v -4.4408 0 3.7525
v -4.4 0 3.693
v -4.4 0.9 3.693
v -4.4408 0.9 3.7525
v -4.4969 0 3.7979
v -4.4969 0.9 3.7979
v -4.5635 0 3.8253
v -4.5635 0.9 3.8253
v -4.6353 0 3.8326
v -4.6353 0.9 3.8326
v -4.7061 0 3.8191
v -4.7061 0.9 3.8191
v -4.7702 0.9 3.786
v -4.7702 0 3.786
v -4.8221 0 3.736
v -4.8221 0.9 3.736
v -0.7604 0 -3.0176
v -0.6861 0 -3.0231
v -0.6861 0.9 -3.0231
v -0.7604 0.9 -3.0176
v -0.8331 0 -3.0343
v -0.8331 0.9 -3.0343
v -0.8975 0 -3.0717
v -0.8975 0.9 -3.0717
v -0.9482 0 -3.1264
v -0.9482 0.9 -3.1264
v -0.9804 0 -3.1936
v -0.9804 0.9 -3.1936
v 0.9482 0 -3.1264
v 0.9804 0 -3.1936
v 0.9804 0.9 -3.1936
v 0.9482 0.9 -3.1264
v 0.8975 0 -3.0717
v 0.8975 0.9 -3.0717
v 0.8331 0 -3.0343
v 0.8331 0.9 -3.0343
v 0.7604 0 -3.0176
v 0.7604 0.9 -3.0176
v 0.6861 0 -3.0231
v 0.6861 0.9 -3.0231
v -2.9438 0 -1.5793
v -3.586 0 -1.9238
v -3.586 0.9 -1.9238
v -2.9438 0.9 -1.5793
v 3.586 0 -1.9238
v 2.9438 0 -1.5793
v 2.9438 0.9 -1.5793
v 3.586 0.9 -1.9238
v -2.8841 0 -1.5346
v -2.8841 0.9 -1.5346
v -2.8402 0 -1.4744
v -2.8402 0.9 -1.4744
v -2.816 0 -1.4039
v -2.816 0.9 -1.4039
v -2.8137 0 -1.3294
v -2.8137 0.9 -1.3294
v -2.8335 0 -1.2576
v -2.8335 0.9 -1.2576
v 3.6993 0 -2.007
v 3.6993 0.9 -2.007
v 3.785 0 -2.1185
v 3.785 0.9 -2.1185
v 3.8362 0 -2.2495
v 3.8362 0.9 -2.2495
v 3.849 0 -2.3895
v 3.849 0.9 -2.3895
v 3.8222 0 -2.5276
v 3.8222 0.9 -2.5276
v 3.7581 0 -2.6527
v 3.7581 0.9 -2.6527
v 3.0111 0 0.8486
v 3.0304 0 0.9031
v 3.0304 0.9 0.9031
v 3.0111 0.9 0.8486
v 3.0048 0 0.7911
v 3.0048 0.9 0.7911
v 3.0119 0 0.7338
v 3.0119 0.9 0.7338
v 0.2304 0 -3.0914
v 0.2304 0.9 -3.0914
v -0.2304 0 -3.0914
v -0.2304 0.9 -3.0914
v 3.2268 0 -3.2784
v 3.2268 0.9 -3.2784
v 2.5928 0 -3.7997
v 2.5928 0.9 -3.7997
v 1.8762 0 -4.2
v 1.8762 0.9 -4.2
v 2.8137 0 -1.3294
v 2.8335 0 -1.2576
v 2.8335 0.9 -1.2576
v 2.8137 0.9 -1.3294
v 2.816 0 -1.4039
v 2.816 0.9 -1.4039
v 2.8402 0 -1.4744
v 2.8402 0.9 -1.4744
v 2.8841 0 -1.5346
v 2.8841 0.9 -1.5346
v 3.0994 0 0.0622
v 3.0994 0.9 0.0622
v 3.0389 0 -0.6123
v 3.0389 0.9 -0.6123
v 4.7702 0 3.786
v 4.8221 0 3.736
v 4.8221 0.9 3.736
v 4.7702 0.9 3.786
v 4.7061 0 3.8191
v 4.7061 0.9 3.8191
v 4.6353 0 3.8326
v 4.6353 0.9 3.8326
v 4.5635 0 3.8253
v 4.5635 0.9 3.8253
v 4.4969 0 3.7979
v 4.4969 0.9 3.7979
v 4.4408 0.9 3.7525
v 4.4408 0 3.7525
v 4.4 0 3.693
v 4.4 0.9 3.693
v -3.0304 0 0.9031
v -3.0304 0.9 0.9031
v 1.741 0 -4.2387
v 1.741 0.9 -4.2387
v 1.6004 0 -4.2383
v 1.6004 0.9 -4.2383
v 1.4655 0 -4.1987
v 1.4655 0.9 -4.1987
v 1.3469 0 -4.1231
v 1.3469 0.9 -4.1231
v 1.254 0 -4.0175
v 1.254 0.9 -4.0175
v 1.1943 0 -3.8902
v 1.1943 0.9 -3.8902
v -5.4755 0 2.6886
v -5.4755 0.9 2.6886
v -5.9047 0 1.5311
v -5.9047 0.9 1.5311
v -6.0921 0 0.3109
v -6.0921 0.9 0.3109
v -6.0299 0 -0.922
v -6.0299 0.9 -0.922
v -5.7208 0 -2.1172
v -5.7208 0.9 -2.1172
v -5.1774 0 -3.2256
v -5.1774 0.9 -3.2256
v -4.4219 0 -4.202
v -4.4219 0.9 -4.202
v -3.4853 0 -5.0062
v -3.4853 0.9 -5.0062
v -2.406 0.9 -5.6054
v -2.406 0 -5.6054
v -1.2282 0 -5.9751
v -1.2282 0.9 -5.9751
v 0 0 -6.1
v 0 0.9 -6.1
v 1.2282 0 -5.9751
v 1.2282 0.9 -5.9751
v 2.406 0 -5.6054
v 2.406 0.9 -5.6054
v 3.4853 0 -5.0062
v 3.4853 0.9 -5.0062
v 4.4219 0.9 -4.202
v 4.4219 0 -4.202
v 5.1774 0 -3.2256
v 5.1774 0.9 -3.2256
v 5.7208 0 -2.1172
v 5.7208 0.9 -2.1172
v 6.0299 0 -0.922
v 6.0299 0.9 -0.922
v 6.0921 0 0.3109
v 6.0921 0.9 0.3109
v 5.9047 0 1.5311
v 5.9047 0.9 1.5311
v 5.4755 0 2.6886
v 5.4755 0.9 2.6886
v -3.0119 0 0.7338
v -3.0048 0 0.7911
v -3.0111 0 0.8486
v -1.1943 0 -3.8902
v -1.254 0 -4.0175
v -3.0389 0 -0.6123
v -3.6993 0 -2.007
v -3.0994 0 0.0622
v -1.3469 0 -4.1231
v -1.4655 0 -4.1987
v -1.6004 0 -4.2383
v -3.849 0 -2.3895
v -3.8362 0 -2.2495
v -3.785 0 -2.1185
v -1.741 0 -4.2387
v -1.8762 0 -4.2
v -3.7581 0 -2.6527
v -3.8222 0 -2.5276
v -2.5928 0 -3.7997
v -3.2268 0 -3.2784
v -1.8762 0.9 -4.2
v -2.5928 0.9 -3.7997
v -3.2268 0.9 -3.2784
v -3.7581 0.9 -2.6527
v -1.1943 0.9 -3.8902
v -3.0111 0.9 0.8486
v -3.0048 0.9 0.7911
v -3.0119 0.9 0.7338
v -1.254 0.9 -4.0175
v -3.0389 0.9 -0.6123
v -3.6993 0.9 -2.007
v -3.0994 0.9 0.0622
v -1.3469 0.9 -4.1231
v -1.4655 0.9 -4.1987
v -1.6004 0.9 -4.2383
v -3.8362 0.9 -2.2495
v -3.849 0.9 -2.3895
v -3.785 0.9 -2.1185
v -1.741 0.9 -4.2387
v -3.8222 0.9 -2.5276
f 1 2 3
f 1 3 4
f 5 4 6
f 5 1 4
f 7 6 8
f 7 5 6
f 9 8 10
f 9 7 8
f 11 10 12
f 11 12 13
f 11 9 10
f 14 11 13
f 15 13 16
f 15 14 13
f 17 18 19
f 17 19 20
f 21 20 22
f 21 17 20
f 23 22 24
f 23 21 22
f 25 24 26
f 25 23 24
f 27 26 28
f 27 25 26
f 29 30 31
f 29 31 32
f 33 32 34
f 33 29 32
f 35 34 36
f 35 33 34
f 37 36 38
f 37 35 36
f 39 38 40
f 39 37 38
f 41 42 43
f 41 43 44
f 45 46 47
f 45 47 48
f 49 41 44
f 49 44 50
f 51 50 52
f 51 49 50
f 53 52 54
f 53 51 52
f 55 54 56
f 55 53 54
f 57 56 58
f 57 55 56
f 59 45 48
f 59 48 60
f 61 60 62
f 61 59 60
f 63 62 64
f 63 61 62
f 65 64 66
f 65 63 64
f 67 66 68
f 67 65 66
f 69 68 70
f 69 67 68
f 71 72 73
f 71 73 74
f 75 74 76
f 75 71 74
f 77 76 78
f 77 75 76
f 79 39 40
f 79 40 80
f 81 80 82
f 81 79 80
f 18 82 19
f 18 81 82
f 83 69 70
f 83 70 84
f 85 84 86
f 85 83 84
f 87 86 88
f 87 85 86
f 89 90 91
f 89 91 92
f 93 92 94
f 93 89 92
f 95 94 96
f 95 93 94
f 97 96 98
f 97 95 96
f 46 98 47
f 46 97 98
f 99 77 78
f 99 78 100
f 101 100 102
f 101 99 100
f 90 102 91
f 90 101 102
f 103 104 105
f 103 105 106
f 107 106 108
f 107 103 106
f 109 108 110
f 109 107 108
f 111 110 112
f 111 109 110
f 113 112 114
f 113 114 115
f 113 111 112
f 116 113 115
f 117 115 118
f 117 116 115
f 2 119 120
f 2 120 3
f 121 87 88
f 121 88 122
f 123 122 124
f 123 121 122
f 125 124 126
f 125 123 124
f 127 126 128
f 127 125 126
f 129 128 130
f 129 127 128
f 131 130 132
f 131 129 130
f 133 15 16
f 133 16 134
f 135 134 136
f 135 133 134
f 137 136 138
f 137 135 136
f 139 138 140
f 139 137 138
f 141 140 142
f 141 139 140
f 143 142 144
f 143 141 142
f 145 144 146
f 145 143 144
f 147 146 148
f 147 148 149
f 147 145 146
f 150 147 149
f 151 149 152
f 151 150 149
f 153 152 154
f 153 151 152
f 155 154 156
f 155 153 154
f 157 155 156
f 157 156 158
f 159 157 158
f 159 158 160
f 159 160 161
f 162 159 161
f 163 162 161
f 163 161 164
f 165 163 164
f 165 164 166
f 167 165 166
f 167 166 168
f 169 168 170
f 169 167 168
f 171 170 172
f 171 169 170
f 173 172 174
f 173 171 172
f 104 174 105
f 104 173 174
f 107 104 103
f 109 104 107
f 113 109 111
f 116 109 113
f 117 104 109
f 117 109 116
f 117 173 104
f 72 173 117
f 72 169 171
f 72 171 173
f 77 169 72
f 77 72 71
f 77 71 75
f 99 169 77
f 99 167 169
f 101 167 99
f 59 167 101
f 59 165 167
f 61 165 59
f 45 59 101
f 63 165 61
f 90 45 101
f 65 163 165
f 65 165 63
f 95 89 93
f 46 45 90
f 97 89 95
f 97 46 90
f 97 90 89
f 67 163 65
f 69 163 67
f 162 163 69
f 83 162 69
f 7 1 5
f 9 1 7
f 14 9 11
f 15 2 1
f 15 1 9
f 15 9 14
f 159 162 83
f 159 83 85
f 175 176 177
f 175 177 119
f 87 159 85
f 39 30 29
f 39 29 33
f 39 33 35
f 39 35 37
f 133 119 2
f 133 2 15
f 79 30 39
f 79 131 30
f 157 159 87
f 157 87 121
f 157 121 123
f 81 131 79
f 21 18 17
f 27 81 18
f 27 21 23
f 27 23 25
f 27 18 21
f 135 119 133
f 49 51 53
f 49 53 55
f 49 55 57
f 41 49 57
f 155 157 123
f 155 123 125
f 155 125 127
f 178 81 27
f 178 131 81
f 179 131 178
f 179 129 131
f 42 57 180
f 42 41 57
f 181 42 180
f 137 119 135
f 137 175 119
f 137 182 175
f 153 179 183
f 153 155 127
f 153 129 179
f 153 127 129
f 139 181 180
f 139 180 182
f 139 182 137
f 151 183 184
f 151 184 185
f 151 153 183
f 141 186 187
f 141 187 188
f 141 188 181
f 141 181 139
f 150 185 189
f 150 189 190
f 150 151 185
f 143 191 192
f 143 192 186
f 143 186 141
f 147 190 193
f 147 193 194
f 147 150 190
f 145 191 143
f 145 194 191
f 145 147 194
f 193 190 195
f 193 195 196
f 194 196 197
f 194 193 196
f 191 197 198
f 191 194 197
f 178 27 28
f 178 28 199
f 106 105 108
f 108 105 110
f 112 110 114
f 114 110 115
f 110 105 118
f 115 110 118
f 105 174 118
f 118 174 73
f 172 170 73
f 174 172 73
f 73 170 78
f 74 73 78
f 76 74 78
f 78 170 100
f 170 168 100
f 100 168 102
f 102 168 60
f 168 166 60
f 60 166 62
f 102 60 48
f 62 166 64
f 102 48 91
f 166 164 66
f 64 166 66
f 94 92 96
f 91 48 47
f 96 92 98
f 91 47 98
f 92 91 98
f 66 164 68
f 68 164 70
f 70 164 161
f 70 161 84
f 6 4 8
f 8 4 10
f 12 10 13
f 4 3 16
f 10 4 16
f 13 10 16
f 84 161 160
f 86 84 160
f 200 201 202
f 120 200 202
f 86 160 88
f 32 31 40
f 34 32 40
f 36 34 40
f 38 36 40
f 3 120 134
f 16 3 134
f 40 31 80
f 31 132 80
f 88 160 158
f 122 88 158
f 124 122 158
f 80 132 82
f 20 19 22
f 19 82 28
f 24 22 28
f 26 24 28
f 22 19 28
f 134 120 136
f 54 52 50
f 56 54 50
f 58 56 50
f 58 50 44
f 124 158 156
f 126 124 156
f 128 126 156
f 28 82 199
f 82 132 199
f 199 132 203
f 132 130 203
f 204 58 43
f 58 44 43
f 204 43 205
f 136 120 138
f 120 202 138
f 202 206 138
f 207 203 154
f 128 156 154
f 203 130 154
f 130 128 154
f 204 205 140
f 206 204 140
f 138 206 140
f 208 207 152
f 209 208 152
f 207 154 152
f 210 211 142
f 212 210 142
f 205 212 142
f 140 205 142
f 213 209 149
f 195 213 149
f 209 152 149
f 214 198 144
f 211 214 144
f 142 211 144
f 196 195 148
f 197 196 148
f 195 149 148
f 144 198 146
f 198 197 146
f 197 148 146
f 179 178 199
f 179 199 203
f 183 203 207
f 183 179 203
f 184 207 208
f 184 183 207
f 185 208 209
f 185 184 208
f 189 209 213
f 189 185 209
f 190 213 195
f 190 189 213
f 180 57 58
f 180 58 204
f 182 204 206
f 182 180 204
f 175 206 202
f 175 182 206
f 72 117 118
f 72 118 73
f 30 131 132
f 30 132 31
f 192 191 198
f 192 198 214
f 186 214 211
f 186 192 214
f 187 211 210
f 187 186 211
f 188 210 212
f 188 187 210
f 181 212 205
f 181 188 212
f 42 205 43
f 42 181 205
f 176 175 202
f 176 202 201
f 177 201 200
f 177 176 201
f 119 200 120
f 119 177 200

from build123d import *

# Parameters (mm, degrees)
BOSS_EXTRUDE2_DEPTH = 0.9


with BuildPart() as part:
    # Sketch2 → Boss-Extrude2 (new body)
    with BuildSketch(Plane(origin=(0, 0, 0), x_dir=(1, 0, 0), z_dir=(0, 1, 0))):
        with BuildLine():
            Line((-0.980410681, 3.193555213), (-1.194279845, 3.890205091))
            ThreePointArc((-1.194279845, 3.890205091), (-1.465461571, 4.198694788), (-1.876197196, 4.1999862))
            ThreePointArc((-1.876197196, 4.1999862), (-2.921430522, 3.553201895), (-3.758071134, 2.652715844))
            ThreePointArc((-3.758071134, 2.652715844), (-3.836204314, 2.249478162), (-3.585956323, 1.92377682))
            Line((-3.585956323, 1.92377682), (-2.943790684, 1.579270847))
            ThreePointArc((-2.943790684, 1.579270847), (-2.825493737, 1.440063272), (-2.833470582, 1.257554952))
            ThreePointArc((-2.833470582, 1.257554952), (-3.087628894, 0.276672749), (-3.011906881, -0.733768997))
            ThreePointArc((-3.011906881, -0.733768997), (-3.006278091, -0.820065307), (-3.030387689, -0.903116277))
            Line((-3.030387689, -0.903116277), (-4.400044699, -3.693030626))
            ThreePointArc((-4.400044699, -3.693030626), (-4.599153629, -3.831574182), (-4.822086086, -3.735971866))
            ThreePointArc((-4.822086086, -3.735971866), (0, 6.1), (4.822086086, -3.735971866))
            ThreePointArc((4.822086086, -3.735971866), (4.599153629, -3.831574182), (4.400044699, -3.693030626))
            Line((4.400044699, -3.693030626), (3.030387689, -0.903116277))
            ThreePointArc((3.030387689, -0.903116277), (3.006278091, -0.820065307), (3.011906881, -0.733768997))
            ThreePointArc((3.011906881, -0.733768997), (3.087628894, 0.276672749), (2.833470582, 1.257554952))
            ThreePointArc((2.833470582, 1.257554952), (2.825493737, 1.440063272), (2.943790684, 1.579270847))
            Line((2.943790684, 1.579270847), (3.585956323, 1.92377682))
            ThreePointArc((3.585956323, 1.92377682), (3.836204314, 2.249478162), (3.758071134, 2.652715844))
            ThreePointArc((3.758071134, 2.652715844), (2.921430522, 3.553201895), (1.876197196, 4.1999862))
            ThreePointArc((1.876197196, 4.1999862), (1.465461571, 4.198694788), (1.194279845, 3.890205091))
            Line((1.194279845, 3.890205091), (0.980410681, 3.193555213))
            ThreePointArc((0.980410681, 3.193555213), (0.866697189, 3.050579136), (0.68608945, 3.023124421))
            ThreePointArc((0.68608945, 3.023124421), (0, 3.1), (-0.68608945, 3.023124421))
            ThreePointArc((-0.68608945, 3.023124421), (-0.866697189, 3.050579136), (-0.980410681, 3.193555213))
        make_face()
    extrude(amount=BOSS_EXTRUDE2_DEPTH)


solid = part.part
